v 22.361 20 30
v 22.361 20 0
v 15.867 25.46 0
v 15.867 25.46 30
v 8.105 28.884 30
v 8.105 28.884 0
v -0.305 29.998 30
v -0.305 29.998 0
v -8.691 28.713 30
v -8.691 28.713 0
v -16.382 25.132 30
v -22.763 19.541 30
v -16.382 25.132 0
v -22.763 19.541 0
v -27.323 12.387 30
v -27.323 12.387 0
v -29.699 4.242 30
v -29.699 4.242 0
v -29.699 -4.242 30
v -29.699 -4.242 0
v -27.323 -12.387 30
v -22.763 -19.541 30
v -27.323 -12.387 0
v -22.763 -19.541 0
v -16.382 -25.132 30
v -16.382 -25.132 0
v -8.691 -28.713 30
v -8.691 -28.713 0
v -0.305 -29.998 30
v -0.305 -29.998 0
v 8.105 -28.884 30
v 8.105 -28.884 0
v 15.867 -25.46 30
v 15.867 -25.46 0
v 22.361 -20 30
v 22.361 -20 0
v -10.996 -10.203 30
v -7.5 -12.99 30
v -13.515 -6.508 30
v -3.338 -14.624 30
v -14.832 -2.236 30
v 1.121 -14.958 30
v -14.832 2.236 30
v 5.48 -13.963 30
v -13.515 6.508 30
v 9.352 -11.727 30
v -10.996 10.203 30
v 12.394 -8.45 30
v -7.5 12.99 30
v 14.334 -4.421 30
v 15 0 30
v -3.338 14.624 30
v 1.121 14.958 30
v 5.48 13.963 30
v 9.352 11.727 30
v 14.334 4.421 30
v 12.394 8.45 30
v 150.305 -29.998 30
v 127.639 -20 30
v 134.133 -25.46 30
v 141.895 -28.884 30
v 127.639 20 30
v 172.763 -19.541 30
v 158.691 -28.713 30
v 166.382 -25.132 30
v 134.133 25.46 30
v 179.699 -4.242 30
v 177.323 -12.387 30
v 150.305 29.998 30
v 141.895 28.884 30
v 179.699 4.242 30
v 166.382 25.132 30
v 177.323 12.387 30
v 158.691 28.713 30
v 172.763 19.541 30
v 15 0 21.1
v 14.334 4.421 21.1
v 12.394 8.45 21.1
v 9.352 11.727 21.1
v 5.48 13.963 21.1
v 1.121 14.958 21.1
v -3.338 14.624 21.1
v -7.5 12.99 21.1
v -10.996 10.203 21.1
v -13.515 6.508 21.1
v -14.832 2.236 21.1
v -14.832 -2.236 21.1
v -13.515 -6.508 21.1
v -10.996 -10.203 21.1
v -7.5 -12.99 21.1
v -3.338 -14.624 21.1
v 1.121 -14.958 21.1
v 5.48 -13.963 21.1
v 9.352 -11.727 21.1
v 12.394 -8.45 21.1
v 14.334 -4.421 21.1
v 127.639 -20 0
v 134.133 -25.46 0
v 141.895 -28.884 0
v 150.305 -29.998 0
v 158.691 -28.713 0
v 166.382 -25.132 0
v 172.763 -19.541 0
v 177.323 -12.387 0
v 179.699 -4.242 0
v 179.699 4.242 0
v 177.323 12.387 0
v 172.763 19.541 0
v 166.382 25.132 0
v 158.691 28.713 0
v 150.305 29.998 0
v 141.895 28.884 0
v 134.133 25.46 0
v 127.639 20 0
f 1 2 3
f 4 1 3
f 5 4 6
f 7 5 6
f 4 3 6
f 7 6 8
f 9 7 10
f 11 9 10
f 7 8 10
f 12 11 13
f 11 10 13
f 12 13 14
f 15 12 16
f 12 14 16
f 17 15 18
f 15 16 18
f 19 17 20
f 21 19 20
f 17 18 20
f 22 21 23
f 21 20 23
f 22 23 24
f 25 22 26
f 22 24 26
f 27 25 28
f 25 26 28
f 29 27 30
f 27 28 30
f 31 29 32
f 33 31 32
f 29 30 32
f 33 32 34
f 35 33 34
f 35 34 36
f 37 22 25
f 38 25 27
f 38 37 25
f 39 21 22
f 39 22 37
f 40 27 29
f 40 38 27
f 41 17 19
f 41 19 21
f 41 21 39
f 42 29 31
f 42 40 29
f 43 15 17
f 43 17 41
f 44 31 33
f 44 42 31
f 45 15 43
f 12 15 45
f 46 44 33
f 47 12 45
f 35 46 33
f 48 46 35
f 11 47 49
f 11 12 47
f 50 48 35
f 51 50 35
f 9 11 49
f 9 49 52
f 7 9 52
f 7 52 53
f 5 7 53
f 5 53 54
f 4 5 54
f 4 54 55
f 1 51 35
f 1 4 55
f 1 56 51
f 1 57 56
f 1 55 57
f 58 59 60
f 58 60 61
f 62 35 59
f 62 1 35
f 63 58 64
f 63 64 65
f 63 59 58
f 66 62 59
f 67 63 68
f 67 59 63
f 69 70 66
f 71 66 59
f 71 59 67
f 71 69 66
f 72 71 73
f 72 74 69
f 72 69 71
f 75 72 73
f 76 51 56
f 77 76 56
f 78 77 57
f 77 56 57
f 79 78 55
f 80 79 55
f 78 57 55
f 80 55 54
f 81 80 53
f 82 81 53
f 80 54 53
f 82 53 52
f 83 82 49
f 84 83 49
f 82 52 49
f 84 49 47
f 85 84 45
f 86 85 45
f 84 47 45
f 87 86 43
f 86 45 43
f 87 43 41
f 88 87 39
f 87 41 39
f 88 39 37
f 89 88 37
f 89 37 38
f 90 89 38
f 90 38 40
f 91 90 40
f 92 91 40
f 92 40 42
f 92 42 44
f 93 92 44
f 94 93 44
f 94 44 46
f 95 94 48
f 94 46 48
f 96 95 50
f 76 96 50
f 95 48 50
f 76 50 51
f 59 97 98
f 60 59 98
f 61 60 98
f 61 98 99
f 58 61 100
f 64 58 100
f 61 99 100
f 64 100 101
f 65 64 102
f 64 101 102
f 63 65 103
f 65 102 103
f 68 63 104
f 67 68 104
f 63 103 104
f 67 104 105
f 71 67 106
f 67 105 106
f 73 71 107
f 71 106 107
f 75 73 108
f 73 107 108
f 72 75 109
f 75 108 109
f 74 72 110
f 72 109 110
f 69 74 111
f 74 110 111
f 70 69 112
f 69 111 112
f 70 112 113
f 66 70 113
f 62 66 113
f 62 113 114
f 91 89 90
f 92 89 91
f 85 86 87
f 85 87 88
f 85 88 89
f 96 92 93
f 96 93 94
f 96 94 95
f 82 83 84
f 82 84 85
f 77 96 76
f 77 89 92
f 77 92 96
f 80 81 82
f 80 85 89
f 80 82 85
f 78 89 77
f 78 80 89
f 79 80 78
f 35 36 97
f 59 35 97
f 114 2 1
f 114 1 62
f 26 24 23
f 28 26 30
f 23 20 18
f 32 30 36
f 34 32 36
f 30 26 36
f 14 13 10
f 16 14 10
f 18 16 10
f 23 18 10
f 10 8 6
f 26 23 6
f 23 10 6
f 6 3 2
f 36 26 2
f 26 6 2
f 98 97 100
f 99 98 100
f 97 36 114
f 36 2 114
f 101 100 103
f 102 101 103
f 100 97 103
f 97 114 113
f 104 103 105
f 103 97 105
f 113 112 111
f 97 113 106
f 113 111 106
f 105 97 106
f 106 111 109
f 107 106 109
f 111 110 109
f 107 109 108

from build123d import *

# Parameters (mm, degrees)
SKETCH1_R           = 30
SKETCH1_W           = 150
SKETCH1_H           = 40
BOSS_EXTRUDE1_DEPTH = 30
SKETCH2_R           = 15
CUT_EXTRUDE1_DEPTH  = 8.9


with BuildPart() as part:
    # Sketch1 → Boss-Extrude1 (new body)
    with BuildSketch(Plane.XY):
        Circle(SKETCH1_R)
        with Locations((150, 0)):
            Circle(SKETCH1_R)
        with Locations((75, 0)):
            Rectangle(SKETCH1_W, SKETCH1_H)
    extrude(amount=BOSS_EXTRUDE1_DEPTH)

    # Sketch2 → Cut-Extrude1 (cut)
    with BuildSketch(Plane.XY.offset(30)):
        Circle(SKETCH2_R)
    extrude(amount=-CUT_EXTRUDE1_DEPTH, mode=Mode.SUBTRACT)


solid = part.part
